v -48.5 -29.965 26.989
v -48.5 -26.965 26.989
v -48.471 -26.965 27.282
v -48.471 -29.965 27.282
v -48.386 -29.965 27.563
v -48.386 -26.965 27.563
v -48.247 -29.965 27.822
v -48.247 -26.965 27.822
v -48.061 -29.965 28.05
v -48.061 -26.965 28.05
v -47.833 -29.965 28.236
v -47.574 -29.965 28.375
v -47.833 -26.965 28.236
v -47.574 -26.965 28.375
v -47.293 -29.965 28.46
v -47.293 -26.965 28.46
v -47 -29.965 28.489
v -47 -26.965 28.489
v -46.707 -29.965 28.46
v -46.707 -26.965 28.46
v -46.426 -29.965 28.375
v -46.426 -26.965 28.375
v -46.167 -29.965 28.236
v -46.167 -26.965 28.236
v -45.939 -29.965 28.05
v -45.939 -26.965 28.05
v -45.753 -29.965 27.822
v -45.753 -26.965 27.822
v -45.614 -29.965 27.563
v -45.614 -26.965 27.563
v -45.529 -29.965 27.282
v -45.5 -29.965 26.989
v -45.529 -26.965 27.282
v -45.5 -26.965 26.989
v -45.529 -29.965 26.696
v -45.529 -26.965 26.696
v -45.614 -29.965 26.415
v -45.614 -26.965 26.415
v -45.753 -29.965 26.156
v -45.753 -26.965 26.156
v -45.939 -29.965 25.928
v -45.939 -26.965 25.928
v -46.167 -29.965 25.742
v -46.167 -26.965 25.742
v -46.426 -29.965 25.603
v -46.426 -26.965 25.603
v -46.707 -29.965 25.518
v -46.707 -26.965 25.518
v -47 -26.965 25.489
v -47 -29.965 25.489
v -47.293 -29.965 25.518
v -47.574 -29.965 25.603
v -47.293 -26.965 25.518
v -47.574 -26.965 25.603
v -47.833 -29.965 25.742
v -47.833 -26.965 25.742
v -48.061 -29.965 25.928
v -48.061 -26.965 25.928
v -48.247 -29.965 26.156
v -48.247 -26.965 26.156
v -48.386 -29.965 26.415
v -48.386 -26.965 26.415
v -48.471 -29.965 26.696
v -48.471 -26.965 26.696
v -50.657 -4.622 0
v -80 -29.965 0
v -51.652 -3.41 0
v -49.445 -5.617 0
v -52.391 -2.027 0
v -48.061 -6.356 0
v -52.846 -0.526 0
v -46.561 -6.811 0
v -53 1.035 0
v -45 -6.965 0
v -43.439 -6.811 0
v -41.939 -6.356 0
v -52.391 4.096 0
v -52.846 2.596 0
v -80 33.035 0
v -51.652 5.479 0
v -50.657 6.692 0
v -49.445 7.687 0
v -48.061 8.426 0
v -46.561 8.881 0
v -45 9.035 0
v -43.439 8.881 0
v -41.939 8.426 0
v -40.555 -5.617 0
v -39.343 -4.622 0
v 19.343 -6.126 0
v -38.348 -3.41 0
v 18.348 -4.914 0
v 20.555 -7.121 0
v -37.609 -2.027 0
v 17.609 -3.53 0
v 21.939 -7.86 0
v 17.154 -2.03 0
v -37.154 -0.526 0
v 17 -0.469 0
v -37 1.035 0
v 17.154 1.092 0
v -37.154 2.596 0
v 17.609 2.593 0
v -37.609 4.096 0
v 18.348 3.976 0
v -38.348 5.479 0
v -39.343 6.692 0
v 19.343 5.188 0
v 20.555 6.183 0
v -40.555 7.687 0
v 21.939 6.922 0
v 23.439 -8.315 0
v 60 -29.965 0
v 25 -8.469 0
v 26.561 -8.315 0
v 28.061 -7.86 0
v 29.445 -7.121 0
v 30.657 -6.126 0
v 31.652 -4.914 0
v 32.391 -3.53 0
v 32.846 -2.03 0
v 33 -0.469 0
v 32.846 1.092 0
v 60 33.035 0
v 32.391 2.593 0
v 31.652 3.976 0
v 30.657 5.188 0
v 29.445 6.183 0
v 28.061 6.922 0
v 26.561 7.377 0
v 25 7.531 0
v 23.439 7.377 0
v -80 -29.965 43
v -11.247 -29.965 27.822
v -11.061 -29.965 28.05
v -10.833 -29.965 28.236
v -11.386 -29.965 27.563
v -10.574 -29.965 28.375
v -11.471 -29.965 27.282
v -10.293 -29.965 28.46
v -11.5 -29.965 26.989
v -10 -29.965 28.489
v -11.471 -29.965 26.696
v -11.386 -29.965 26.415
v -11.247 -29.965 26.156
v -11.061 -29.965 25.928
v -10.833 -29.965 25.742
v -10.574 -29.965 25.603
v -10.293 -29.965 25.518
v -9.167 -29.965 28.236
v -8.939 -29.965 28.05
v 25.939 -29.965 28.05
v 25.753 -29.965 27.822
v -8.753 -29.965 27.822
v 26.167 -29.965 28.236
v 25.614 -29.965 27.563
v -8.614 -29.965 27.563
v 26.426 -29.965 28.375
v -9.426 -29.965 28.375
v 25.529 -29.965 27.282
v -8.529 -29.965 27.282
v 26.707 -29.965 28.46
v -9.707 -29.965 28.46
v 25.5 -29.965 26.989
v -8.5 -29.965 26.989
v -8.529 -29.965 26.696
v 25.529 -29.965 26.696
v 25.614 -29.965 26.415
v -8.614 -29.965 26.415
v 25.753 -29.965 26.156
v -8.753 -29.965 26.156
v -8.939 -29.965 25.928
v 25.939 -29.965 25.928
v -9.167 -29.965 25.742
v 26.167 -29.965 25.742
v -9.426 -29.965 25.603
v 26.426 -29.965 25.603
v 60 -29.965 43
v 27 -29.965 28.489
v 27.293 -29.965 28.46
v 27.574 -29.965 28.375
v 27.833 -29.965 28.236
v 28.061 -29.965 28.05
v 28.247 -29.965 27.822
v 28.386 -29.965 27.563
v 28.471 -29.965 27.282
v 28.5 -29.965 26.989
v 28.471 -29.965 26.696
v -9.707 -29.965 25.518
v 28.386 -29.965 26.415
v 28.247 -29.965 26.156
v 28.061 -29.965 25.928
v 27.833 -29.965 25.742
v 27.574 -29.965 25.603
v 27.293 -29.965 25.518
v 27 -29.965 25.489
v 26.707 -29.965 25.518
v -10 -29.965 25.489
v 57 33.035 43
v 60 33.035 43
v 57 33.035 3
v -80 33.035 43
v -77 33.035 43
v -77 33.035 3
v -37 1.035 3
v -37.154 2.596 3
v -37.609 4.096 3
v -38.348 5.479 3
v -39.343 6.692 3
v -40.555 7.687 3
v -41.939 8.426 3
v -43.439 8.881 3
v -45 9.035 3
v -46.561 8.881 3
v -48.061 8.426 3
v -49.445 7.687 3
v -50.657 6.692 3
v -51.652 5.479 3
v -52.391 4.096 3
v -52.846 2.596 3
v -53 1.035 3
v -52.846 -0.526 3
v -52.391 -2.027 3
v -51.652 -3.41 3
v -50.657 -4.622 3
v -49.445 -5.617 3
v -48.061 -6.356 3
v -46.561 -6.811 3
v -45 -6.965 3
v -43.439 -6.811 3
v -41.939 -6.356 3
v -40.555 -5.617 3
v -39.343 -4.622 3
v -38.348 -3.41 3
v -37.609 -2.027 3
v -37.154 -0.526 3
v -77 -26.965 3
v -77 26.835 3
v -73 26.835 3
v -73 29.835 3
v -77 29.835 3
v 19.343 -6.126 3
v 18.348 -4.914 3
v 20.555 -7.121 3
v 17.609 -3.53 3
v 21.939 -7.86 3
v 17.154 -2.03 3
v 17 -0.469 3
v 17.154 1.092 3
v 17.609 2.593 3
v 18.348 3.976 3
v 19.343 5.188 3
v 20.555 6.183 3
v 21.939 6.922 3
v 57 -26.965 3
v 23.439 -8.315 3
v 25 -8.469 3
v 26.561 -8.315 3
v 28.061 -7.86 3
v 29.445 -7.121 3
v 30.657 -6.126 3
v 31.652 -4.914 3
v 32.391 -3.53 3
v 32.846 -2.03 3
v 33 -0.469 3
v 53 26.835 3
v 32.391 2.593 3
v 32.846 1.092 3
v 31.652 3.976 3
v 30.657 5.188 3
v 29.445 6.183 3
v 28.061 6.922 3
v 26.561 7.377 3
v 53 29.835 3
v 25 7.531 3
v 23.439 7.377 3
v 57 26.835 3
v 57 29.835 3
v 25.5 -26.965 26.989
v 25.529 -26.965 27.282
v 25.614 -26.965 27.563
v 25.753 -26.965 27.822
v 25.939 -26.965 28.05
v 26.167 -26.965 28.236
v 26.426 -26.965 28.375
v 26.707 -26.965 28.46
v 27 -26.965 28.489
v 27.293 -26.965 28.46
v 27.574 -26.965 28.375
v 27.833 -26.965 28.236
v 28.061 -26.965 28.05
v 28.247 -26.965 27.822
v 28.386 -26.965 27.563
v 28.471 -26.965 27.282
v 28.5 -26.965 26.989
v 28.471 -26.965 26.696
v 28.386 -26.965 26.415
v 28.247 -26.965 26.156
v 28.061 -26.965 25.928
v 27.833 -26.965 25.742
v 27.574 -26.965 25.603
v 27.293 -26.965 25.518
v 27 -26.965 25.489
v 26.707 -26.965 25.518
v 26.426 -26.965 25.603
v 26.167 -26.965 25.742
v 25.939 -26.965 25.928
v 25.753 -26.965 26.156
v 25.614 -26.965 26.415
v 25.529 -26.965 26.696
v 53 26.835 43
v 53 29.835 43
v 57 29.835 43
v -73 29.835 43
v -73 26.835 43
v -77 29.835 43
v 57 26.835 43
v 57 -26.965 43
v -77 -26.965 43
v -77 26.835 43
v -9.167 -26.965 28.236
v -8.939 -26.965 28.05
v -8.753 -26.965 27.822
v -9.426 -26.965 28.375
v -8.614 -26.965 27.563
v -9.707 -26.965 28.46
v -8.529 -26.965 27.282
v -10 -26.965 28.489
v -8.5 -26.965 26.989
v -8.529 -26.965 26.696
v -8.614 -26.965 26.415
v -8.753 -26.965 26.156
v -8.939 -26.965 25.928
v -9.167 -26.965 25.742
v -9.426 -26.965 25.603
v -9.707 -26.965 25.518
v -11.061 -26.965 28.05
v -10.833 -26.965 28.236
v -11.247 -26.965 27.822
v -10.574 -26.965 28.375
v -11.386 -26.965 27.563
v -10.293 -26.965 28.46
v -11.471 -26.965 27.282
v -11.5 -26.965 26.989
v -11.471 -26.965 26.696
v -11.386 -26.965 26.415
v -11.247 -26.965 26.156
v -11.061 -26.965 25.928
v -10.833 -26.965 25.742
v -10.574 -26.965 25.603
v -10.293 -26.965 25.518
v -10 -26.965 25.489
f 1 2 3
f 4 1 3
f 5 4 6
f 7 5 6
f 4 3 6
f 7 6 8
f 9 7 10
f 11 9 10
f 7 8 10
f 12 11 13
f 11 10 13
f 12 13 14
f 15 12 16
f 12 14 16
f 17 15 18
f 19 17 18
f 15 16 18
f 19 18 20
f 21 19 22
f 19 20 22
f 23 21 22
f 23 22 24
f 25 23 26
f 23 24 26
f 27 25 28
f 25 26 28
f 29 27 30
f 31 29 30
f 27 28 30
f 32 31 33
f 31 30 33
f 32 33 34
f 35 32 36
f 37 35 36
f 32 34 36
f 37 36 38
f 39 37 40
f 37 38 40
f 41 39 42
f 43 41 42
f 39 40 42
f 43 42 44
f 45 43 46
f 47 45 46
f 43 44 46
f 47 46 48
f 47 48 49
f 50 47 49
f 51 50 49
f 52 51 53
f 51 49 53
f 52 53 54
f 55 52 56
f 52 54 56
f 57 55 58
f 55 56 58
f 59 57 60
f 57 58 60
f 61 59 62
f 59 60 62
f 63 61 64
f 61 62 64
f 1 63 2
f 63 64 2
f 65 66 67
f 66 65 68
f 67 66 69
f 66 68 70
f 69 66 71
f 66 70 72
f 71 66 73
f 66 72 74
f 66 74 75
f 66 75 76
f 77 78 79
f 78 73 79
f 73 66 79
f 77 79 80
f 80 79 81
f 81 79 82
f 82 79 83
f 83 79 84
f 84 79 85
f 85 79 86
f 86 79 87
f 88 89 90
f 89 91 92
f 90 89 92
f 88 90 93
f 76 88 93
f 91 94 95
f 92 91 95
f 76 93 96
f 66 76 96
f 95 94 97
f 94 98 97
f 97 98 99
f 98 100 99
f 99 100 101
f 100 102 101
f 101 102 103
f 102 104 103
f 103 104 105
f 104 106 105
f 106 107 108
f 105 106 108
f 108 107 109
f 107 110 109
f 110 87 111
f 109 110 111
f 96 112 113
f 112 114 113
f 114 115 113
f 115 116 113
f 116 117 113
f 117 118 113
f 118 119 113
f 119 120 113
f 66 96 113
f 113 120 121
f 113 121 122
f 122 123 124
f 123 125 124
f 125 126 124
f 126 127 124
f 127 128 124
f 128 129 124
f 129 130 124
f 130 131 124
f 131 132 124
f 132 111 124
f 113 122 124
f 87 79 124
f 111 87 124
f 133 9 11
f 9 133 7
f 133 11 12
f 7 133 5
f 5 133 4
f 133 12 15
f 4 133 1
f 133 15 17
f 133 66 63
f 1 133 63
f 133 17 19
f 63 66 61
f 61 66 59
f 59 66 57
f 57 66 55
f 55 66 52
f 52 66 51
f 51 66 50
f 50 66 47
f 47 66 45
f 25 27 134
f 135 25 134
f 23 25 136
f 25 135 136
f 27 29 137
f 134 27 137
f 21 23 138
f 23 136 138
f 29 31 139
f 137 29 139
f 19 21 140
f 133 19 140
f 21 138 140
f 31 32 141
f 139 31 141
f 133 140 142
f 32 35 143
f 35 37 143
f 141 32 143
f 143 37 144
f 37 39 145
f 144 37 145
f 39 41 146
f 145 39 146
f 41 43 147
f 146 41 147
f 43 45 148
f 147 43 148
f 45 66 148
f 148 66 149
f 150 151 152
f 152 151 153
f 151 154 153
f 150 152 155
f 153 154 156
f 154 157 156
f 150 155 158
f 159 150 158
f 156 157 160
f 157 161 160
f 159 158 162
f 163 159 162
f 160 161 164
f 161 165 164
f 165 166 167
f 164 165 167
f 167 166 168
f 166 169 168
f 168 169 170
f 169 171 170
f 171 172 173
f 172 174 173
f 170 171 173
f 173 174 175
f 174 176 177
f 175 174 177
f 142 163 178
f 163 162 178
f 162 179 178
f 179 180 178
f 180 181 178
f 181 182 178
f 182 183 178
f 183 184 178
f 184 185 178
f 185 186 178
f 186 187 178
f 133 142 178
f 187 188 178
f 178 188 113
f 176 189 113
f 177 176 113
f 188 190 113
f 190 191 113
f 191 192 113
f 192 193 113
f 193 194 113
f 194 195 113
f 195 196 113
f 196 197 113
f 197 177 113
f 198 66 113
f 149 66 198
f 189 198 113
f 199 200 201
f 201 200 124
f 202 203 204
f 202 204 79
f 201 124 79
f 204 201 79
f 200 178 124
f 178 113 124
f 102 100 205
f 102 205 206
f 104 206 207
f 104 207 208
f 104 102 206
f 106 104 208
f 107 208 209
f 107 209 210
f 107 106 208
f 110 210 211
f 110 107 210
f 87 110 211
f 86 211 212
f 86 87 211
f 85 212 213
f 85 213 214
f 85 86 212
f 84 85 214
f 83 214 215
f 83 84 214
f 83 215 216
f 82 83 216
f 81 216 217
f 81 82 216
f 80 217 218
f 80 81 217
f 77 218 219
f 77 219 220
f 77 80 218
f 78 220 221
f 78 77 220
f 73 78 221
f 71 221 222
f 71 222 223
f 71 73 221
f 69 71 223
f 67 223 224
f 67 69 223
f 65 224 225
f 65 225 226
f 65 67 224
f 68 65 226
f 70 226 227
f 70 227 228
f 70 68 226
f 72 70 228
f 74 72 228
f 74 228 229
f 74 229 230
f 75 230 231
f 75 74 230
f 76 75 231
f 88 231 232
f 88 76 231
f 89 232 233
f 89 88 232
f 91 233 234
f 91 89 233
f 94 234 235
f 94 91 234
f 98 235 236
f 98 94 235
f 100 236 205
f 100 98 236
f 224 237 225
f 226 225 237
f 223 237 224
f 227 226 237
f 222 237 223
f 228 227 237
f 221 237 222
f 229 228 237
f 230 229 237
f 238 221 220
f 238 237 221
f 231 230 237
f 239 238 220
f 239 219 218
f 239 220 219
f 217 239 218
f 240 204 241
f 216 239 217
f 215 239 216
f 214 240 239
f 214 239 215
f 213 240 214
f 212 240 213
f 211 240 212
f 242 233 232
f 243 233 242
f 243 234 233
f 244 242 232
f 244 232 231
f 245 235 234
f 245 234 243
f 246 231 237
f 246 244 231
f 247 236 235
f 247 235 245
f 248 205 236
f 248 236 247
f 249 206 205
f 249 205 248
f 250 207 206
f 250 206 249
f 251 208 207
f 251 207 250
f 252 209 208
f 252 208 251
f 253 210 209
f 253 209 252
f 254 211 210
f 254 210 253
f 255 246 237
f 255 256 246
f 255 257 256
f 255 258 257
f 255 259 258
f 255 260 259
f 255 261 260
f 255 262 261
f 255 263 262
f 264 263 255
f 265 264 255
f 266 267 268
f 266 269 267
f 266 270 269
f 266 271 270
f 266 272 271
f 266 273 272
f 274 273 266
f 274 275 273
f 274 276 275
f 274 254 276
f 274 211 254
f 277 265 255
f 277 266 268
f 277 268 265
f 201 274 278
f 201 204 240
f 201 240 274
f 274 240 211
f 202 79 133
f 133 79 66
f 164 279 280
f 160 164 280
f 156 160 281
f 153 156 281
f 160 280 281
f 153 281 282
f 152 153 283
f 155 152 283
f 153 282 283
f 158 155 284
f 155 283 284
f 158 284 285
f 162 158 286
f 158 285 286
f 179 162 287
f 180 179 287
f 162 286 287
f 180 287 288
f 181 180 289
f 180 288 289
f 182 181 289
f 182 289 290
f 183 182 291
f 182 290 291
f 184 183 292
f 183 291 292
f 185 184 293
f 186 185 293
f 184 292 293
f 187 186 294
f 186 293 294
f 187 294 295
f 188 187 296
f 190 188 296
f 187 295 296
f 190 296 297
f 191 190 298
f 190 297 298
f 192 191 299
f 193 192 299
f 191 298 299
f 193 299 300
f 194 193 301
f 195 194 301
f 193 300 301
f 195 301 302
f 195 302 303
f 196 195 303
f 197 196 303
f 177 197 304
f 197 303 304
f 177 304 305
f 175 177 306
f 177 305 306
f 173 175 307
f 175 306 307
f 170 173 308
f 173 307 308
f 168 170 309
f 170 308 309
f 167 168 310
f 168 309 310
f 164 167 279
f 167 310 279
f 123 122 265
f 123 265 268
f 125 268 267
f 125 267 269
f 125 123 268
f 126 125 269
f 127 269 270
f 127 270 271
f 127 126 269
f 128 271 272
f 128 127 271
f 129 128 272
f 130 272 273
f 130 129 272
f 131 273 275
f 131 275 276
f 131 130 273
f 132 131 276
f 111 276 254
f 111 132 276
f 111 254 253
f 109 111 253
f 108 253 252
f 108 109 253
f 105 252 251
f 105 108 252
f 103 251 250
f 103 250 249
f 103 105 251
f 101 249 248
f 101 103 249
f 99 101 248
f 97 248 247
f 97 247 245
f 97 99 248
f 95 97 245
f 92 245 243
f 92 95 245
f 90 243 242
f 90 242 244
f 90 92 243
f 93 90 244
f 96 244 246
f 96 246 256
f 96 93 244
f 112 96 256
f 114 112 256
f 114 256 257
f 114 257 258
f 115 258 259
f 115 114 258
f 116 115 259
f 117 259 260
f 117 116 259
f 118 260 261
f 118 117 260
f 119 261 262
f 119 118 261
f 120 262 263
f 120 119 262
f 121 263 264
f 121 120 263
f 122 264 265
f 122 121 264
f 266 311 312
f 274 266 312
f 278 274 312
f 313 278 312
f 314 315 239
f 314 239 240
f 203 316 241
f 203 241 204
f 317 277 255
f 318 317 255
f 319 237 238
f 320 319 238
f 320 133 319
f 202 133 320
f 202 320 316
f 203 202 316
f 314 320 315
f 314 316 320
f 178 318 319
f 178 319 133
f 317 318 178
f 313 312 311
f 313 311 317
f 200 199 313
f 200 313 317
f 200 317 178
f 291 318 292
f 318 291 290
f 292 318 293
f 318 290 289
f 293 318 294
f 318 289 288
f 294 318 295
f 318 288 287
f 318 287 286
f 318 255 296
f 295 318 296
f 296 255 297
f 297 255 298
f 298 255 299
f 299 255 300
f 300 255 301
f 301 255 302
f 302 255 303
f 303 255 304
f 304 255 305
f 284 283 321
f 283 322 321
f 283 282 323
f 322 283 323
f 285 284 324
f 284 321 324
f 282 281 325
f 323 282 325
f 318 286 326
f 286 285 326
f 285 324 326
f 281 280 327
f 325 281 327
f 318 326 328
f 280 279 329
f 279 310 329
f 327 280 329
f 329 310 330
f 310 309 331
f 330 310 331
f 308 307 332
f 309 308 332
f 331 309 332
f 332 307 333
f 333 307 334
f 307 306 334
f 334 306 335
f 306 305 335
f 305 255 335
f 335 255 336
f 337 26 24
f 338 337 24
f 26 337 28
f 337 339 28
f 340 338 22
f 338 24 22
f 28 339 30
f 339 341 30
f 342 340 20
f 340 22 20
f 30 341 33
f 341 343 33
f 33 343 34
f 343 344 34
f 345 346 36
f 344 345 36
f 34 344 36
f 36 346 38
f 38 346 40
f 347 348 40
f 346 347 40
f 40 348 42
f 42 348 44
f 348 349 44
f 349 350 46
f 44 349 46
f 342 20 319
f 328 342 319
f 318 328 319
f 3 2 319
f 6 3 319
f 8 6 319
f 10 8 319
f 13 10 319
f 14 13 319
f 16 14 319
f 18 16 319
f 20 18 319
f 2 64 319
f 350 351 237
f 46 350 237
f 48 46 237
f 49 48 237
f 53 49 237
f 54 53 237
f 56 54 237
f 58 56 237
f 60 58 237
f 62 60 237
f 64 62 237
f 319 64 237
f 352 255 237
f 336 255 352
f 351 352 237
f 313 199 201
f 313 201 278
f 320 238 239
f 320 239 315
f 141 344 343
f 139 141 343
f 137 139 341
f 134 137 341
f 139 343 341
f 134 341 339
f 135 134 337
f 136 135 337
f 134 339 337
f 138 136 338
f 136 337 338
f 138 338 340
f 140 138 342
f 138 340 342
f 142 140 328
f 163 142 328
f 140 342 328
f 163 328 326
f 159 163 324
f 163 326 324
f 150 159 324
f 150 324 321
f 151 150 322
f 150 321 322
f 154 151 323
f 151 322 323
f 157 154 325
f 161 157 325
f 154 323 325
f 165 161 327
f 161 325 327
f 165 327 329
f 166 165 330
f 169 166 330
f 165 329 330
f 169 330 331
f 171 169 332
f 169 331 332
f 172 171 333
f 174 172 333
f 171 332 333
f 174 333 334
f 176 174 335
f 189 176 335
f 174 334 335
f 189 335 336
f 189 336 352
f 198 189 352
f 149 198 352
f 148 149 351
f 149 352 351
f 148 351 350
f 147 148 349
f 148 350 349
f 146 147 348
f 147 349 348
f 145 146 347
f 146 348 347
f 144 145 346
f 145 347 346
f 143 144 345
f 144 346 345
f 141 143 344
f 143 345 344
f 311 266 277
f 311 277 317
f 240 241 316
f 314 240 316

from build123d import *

# Parameters (mm, degrees)
F0_R     = 8
F1_DEPTH = 3
F2_W     = 3
F2_H     = 3
F2_W_2   = 134
F3_DEPTH = 40
F4_W     = 3
F4_H     = 40
F5_DEPTH = 134
F6_W     = 126
F6_H     = 3
F7_DEPTH = 40
F8_R     = 1.5
F9_DEPTH = 3


with BuildPart() as f1:
    # F0 (on Top) → F1 (new body)
    with BuildSketch(Plane.XY):
        Polygon((-60, 33.034884), (-80, 33.034884), (-80, 18.034884), (-80, 0.034884), (-80, -2.965116), (-80, -17.965116), (-80, -29.965116), (60, -29.965116), (60, -24.965116), (60, -14.965116), (60, -9.965116), (60, -4.965116), (60, 0.034884), (60, 18.034884), (60, 33.034884), (40, 33.034884), (20, 33.034884), (0, 33.034884), (-20, 33.034884), (-40, 33.034884), align=None)
        with Locations((25, -0.468963)):
            Circle(F0_R, mode=Mode.SUBTRACT)
        with Locations((-45, 1.034884)):
            Circle(F0_R, mode=Mode.SUBTRACT)
    extrude(amount=F1_DEPTH)

    # F2 (on face) → F3 (join)
    with BuildSketch(Plane.XY.offset(3)):
        with Locations((-78.5, -28.465116)):
            Rectangle(F2_W, F2_H)
        with Locations((-10, -28.465116)):
            Rectangle(F2_W_2, F2_H)
        Polygon((-80, 30.034884), (-80, -26.965116), (-77, -26.965116), (-77, 33.034884), (-80, 33.034884), align=None)
        with Locations((58.5, -28.465116)):
            Rectangle(F2_W, F2_H)
        Polygon((57, 33.034884), (57, -26.965116), (60, -26.965116), (60, 30.034884), (60, 33.034884), align=None)
    extrude(amount=F3_DEPTH)

    # F4 (on face) → F5 (join)
    with BuildSketch(Plane.YZ.offset(-77)):
        with Locations((28.334884, 23)):
            Rectangle(F4_W, F4_H)
    extrude(amount=F5_DEPTH)

    # F6 (on face) → F7 (cut)
    with BuildSketch(Plane.XY.offset(43)):
        with Locations((-10, 28.334884)):
            Rectangle(F6_W, F6_H)
    extrude(amount=-F7_DEPTH, mode=Mode.SUBTRACT)

    # F8 (on face) → F9 (cut)
    with BuildSketch(Plane(origin=(0, -26.965116, 0), x_dir=(-1, 0, 0), z_dir=(0, 1, 0))):
        with Locations((47, 26.988985)):
            Circle(F8_R)
        with Locations((-27, 26.988985)):
            Circle(F8_R)
        with Locations((10, 26.988985)):
            Circle(F8_R)
    extrude(amount=-F9_DEPTH, mode=Mode.SUBTRACT)


solid = f1.part
